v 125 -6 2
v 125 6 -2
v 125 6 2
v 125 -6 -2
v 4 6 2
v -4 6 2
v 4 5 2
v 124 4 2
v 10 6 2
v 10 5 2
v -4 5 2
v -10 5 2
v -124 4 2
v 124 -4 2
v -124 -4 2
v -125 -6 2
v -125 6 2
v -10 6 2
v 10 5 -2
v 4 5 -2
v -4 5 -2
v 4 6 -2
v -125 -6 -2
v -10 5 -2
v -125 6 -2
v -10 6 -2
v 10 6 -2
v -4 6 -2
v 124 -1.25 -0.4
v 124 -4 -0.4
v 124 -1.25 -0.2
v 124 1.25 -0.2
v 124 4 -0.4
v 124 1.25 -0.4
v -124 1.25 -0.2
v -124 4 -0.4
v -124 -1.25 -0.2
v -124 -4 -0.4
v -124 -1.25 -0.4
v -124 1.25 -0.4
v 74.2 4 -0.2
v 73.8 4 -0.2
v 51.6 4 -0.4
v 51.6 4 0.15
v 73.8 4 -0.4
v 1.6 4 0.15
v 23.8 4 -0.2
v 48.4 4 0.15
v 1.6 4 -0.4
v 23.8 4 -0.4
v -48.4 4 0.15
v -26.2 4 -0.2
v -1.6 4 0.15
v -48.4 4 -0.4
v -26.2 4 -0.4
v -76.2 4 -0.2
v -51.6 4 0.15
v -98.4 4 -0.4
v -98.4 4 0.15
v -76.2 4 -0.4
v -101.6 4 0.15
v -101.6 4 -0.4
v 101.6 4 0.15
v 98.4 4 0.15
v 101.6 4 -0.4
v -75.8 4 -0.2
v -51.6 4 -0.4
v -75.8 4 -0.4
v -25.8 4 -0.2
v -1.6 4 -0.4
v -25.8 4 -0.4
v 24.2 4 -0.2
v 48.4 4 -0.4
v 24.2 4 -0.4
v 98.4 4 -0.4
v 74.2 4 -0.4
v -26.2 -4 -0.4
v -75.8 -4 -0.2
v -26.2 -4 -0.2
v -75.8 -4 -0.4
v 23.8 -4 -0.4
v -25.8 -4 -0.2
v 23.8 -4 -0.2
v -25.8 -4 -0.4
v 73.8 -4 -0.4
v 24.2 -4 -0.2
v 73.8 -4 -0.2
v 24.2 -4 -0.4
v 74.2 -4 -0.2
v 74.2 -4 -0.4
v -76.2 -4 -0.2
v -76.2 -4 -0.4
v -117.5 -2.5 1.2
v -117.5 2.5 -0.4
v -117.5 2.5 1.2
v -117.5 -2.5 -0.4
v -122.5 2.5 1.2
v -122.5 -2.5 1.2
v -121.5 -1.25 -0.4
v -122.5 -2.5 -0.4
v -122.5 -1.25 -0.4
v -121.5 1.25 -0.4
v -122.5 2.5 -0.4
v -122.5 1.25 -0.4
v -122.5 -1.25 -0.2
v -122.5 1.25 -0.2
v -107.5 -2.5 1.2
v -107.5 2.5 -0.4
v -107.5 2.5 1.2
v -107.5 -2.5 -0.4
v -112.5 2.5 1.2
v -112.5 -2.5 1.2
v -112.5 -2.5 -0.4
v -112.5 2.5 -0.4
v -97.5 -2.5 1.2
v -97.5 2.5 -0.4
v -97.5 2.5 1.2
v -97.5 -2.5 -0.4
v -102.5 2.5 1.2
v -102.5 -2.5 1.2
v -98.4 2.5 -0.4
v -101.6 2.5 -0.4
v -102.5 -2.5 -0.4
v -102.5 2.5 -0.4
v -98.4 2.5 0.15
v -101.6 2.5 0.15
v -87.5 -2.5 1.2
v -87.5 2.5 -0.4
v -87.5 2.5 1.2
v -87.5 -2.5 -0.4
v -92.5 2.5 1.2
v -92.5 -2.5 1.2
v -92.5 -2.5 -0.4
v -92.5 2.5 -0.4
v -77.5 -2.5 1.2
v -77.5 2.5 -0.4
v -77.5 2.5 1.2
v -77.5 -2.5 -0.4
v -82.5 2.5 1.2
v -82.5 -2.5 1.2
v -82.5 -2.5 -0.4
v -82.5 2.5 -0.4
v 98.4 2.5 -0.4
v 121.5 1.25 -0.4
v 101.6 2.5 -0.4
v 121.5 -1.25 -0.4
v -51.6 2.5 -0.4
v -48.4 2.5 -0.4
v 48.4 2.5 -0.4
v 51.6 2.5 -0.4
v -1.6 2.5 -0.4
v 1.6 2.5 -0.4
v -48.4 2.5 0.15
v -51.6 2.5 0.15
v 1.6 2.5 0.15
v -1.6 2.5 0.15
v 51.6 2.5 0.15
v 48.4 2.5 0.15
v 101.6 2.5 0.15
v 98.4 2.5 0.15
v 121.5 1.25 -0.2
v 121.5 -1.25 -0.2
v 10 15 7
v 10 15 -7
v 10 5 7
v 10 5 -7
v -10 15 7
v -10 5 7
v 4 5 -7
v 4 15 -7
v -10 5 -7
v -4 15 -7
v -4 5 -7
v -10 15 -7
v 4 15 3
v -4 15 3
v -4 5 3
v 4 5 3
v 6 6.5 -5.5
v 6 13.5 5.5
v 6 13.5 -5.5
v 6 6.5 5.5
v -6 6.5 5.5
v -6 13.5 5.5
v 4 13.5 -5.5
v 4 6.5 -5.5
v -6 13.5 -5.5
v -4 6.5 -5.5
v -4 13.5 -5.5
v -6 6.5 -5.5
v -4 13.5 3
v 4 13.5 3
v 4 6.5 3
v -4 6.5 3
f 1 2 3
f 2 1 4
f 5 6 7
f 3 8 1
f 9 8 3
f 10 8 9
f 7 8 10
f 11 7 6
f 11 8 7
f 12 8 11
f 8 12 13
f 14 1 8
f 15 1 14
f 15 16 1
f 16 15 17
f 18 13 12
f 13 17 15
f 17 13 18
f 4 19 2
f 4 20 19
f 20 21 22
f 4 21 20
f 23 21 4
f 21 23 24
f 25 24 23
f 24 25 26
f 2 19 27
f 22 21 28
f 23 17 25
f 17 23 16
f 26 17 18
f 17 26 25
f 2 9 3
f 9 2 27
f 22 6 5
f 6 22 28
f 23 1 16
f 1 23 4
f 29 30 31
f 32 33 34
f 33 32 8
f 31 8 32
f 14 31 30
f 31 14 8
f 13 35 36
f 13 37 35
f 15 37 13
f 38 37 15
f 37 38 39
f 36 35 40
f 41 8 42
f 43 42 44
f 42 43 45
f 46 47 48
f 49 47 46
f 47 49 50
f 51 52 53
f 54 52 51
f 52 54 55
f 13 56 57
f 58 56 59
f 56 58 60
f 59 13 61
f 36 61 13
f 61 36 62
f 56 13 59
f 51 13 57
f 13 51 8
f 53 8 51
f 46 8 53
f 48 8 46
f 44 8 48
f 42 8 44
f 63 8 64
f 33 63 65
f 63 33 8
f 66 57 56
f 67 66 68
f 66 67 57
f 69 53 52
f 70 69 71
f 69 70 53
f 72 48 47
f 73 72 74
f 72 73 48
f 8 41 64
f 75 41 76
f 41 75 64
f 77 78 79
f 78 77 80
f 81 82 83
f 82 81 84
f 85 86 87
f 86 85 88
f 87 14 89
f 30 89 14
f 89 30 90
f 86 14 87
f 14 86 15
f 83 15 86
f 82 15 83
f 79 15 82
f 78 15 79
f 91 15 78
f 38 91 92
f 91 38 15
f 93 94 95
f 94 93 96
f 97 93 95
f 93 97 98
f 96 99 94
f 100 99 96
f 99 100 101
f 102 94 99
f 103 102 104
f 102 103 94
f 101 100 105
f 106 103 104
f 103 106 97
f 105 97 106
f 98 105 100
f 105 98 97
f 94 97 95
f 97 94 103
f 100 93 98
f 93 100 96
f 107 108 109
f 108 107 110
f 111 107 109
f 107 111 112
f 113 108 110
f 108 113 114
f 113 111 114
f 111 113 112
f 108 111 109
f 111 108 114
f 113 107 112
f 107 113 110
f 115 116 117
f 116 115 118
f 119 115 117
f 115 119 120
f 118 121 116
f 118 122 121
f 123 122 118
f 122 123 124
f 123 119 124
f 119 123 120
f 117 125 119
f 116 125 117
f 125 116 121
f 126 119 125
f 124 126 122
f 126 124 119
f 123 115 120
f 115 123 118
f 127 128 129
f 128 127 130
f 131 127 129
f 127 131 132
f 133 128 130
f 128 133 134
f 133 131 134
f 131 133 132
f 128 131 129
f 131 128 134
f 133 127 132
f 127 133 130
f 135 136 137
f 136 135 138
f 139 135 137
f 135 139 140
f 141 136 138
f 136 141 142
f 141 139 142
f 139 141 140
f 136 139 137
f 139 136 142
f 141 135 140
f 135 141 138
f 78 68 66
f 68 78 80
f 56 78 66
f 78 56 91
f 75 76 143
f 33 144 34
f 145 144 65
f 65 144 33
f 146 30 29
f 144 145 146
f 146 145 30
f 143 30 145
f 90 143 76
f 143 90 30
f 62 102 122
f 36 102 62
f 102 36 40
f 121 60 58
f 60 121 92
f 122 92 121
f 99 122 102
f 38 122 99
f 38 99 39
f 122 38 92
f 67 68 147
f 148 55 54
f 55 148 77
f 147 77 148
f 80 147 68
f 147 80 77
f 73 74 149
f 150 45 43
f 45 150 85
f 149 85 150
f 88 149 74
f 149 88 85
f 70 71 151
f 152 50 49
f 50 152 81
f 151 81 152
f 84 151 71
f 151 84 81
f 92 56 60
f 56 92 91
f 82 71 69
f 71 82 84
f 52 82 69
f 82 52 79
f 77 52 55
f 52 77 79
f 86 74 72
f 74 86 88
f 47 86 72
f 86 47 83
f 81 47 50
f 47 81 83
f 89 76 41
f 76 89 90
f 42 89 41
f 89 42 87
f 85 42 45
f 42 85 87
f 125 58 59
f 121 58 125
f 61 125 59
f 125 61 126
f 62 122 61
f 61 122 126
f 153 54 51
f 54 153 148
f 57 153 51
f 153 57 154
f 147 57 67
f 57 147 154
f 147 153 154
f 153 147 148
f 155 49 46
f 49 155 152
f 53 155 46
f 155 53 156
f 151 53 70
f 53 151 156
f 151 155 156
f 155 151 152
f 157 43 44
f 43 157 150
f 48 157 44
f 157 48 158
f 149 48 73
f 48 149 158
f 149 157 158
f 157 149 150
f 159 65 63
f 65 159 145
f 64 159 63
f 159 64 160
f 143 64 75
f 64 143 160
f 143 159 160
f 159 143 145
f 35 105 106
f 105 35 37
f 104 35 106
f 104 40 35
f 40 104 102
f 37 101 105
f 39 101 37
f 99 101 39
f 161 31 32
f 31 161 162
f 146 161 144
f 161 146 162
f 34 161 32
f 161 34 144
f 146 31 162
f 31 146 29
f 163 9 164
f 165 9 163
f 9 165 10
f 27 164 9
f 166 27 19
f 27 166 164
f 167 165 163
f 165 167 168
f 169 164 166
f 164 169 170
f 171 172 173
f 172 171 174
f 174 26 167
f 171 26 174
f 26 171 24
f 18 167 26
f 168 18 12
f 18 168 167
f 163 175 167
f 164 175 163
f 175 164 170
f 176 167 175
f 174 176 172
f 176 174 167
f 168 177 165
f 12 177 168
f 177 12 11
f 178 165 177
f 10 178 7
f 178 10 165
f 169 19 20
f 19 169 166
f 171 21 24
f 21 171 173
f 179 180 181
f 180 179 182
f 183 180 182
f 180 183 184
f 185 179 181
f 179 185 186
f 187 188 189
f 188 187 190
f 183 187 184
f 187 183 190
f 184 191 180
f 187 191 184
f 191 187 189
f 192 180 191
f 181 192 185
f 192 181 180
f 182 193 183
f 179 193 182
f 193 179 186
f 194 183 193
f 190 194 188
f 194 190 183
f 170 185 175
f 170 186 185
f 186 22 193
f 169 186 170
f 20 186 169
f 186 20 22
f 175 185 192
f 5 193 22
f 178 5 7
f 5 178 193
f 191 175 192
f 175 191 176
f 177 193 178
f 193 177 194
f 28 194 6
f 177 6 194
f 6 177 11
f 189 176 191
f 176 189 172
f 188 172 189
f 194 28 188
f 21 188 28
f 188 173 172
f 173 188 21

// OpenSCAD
// Parameters
segments = 5; //[1:20:1]
segment_length_mm = 50; //[25:100:1]
overall_length_mm = 250; //[125:500:1]
width_mm = 12; //[6:24:1]
depth_mm = 4; //[2:8:1]
thickness_mm = 1; //[0.5:2:0.1]
aperture_width_mm = 8; //[4:16:1]
pcb_thickness_mm = 1.6; //[0.8:2.4:0.1]
led_count = 25; //[5:120:1]
led_pitch_mm = 10; //[5:20:0.5]
overlap_mm = 1; //[0.5:2:0.1]
led_body_size_mm = 5; //[3:7:0.5]
led_lens_d_mm = 3.5; //[2:5:0.1]
led_height_mm = 1.6; //[0.8:2.5:0.1]
pad_size_mm = 2.5; //[1.5:4:0.1]
pad_thickness_mm = 0.2; //[0.1:0.6:0.05]
marker_thickness_mm = 0.2; //[0.1:0.6:0.05]
marker_width_mm = 0.4; //[0.2:1:0.05]
resistor_size_x_mm = 3.2; //[2:5:0.1]
resistor_size_y_mm = 1.5; //[1:3:0.1]
resistor_height_mm = 0.55; //[0.3:1.2:0.05]
clip_wall_mm = 1.5; //[0.8:3:0.1]
clip_depth_mm = 10; //[5:25:1]
clip_length_mm = 20; //[10:40:1]
clip_width_mm = 14; //[8:28:1]
clip_slot_mm = 12; //[6:24:1]

// Light Strip - complete geometry
module light_strip() {
  color([0.85, 0.85, 0.8]) {
    // Rigid strip body
    difference() {
      cube([segments * segment_length_mm, width_mm, depth_mm], center=true);
      translate([0, 0, thickness_mm/2])
        cube([segments * segment_length_mm - 2 * thickness_mm, aperture_width_mm, depth_mm - thickness_mm], center=true);
    }
    // PCB core
    translate([0, 0, -depth_mm/2 + thickness_mm + pcb_thickness_mm/2 - overlap_mm])
      cube([segments * segment_length_mm - 2 * thickness_mm, width_mm - 2 * thickness_mm, pcb_thickness_mm], center=true);
    
    // LED array
    for (i = [0:4]) {
      translate([-segments * segment_length_mm/2 + led_pitch_mm * (i + 0.5), 0, -depth_mm/2 + thickness_mm + pcb_thickness_mm + led_height_mm/2 - overlap_mm]) {
        cube([led_body_size_mm, led_body_size_mm, led_height_mm], center=true);
        cylinder(r=led_lens_d_mm/2, h=led_height_mm, center=true);
      }
    }
    
    // Solder pads
    translate([-segments * segment_length_mm/2 + pad_size_mm/2 + overlap_mm, 0, -depth_mm/2 + thickness_mm + pcb_thickness_mm + pad_thickness_mm/2 - overlap_mm])
      cube([pad_size_mm, pad_size_mm, pad_thickness_mm], center=true);
    translate([segments * segment_length_mm/2 - pad_size_mm/2 - overlap_mm, 0, -depth_mm/2 + thickness_mm + pcb_thickness_mm + pad_thickness_mm/2 - overlap_mm])
      cube([pad_size_mm, pad_size_mm, pad_thickness_mm], center=true);
    
    // Segment markers
    for (i = [1:4]) {
      translate([-segments * segment_length_mm/2 + segment_length_mm * i - overlap_mm, 0, -depth_mm/2 + thickness_mm + pcb_thickness_mm + marker_thickness_mm/2 - overlap_mm])
        cube([marker_width_mm, aperture_width_mm, marker_thickness_mm], center=true);
    }
    
    // Resistors
    for (i = [0:4]) {
      translate([-segments * segment_length_mm/2 + segment_length_mm * (i + 0.5), (width_mm - 2 * thickness_mm)/2 - resistor_size_y_mm/2 - overlap_mm, -depth_mm/2 + thickness_mm + pcb_thickness_mm + resistor_height_mm/2 - overlap_mm])
        cube([resistor_size_x_mm, resistor_size_y_mm, resistor_height_mm], center=true);
    }
  }
}

// Light Strip Clip - complete geometry
module light_strip_clip() {
  color([0.15, 0.15, 0.17]) {
    difference() {
      translate([0, width_mm/2 + clip_depth_mm/2 - overlap_mm, 0])
        cube([clip_length_mm, clip_depth_mm, clip_width_mm], center=true);
      translate([0, width_mm/2 + clip_depth_mm/2 - overlap_mm, 0])
        cube([clip_slot_mm, clip_depth_mm - 2 * clip_wall_mm, clip_width_mm - 2 * clip_wall_mm], center=true);
      translate([0, width_mm/2 + clip_depth_mm/2 - overlap_mm, depth_mm/2 - clip_width_mm/2 + overlap_mm])
        cube([aperture_width_mm, clip_depth_mm, clip_width_mm], center=true);
    }
  }
}

// Assembly
module assembly() {
  light_strip();
  light_strip_clip();
}

assembly();
